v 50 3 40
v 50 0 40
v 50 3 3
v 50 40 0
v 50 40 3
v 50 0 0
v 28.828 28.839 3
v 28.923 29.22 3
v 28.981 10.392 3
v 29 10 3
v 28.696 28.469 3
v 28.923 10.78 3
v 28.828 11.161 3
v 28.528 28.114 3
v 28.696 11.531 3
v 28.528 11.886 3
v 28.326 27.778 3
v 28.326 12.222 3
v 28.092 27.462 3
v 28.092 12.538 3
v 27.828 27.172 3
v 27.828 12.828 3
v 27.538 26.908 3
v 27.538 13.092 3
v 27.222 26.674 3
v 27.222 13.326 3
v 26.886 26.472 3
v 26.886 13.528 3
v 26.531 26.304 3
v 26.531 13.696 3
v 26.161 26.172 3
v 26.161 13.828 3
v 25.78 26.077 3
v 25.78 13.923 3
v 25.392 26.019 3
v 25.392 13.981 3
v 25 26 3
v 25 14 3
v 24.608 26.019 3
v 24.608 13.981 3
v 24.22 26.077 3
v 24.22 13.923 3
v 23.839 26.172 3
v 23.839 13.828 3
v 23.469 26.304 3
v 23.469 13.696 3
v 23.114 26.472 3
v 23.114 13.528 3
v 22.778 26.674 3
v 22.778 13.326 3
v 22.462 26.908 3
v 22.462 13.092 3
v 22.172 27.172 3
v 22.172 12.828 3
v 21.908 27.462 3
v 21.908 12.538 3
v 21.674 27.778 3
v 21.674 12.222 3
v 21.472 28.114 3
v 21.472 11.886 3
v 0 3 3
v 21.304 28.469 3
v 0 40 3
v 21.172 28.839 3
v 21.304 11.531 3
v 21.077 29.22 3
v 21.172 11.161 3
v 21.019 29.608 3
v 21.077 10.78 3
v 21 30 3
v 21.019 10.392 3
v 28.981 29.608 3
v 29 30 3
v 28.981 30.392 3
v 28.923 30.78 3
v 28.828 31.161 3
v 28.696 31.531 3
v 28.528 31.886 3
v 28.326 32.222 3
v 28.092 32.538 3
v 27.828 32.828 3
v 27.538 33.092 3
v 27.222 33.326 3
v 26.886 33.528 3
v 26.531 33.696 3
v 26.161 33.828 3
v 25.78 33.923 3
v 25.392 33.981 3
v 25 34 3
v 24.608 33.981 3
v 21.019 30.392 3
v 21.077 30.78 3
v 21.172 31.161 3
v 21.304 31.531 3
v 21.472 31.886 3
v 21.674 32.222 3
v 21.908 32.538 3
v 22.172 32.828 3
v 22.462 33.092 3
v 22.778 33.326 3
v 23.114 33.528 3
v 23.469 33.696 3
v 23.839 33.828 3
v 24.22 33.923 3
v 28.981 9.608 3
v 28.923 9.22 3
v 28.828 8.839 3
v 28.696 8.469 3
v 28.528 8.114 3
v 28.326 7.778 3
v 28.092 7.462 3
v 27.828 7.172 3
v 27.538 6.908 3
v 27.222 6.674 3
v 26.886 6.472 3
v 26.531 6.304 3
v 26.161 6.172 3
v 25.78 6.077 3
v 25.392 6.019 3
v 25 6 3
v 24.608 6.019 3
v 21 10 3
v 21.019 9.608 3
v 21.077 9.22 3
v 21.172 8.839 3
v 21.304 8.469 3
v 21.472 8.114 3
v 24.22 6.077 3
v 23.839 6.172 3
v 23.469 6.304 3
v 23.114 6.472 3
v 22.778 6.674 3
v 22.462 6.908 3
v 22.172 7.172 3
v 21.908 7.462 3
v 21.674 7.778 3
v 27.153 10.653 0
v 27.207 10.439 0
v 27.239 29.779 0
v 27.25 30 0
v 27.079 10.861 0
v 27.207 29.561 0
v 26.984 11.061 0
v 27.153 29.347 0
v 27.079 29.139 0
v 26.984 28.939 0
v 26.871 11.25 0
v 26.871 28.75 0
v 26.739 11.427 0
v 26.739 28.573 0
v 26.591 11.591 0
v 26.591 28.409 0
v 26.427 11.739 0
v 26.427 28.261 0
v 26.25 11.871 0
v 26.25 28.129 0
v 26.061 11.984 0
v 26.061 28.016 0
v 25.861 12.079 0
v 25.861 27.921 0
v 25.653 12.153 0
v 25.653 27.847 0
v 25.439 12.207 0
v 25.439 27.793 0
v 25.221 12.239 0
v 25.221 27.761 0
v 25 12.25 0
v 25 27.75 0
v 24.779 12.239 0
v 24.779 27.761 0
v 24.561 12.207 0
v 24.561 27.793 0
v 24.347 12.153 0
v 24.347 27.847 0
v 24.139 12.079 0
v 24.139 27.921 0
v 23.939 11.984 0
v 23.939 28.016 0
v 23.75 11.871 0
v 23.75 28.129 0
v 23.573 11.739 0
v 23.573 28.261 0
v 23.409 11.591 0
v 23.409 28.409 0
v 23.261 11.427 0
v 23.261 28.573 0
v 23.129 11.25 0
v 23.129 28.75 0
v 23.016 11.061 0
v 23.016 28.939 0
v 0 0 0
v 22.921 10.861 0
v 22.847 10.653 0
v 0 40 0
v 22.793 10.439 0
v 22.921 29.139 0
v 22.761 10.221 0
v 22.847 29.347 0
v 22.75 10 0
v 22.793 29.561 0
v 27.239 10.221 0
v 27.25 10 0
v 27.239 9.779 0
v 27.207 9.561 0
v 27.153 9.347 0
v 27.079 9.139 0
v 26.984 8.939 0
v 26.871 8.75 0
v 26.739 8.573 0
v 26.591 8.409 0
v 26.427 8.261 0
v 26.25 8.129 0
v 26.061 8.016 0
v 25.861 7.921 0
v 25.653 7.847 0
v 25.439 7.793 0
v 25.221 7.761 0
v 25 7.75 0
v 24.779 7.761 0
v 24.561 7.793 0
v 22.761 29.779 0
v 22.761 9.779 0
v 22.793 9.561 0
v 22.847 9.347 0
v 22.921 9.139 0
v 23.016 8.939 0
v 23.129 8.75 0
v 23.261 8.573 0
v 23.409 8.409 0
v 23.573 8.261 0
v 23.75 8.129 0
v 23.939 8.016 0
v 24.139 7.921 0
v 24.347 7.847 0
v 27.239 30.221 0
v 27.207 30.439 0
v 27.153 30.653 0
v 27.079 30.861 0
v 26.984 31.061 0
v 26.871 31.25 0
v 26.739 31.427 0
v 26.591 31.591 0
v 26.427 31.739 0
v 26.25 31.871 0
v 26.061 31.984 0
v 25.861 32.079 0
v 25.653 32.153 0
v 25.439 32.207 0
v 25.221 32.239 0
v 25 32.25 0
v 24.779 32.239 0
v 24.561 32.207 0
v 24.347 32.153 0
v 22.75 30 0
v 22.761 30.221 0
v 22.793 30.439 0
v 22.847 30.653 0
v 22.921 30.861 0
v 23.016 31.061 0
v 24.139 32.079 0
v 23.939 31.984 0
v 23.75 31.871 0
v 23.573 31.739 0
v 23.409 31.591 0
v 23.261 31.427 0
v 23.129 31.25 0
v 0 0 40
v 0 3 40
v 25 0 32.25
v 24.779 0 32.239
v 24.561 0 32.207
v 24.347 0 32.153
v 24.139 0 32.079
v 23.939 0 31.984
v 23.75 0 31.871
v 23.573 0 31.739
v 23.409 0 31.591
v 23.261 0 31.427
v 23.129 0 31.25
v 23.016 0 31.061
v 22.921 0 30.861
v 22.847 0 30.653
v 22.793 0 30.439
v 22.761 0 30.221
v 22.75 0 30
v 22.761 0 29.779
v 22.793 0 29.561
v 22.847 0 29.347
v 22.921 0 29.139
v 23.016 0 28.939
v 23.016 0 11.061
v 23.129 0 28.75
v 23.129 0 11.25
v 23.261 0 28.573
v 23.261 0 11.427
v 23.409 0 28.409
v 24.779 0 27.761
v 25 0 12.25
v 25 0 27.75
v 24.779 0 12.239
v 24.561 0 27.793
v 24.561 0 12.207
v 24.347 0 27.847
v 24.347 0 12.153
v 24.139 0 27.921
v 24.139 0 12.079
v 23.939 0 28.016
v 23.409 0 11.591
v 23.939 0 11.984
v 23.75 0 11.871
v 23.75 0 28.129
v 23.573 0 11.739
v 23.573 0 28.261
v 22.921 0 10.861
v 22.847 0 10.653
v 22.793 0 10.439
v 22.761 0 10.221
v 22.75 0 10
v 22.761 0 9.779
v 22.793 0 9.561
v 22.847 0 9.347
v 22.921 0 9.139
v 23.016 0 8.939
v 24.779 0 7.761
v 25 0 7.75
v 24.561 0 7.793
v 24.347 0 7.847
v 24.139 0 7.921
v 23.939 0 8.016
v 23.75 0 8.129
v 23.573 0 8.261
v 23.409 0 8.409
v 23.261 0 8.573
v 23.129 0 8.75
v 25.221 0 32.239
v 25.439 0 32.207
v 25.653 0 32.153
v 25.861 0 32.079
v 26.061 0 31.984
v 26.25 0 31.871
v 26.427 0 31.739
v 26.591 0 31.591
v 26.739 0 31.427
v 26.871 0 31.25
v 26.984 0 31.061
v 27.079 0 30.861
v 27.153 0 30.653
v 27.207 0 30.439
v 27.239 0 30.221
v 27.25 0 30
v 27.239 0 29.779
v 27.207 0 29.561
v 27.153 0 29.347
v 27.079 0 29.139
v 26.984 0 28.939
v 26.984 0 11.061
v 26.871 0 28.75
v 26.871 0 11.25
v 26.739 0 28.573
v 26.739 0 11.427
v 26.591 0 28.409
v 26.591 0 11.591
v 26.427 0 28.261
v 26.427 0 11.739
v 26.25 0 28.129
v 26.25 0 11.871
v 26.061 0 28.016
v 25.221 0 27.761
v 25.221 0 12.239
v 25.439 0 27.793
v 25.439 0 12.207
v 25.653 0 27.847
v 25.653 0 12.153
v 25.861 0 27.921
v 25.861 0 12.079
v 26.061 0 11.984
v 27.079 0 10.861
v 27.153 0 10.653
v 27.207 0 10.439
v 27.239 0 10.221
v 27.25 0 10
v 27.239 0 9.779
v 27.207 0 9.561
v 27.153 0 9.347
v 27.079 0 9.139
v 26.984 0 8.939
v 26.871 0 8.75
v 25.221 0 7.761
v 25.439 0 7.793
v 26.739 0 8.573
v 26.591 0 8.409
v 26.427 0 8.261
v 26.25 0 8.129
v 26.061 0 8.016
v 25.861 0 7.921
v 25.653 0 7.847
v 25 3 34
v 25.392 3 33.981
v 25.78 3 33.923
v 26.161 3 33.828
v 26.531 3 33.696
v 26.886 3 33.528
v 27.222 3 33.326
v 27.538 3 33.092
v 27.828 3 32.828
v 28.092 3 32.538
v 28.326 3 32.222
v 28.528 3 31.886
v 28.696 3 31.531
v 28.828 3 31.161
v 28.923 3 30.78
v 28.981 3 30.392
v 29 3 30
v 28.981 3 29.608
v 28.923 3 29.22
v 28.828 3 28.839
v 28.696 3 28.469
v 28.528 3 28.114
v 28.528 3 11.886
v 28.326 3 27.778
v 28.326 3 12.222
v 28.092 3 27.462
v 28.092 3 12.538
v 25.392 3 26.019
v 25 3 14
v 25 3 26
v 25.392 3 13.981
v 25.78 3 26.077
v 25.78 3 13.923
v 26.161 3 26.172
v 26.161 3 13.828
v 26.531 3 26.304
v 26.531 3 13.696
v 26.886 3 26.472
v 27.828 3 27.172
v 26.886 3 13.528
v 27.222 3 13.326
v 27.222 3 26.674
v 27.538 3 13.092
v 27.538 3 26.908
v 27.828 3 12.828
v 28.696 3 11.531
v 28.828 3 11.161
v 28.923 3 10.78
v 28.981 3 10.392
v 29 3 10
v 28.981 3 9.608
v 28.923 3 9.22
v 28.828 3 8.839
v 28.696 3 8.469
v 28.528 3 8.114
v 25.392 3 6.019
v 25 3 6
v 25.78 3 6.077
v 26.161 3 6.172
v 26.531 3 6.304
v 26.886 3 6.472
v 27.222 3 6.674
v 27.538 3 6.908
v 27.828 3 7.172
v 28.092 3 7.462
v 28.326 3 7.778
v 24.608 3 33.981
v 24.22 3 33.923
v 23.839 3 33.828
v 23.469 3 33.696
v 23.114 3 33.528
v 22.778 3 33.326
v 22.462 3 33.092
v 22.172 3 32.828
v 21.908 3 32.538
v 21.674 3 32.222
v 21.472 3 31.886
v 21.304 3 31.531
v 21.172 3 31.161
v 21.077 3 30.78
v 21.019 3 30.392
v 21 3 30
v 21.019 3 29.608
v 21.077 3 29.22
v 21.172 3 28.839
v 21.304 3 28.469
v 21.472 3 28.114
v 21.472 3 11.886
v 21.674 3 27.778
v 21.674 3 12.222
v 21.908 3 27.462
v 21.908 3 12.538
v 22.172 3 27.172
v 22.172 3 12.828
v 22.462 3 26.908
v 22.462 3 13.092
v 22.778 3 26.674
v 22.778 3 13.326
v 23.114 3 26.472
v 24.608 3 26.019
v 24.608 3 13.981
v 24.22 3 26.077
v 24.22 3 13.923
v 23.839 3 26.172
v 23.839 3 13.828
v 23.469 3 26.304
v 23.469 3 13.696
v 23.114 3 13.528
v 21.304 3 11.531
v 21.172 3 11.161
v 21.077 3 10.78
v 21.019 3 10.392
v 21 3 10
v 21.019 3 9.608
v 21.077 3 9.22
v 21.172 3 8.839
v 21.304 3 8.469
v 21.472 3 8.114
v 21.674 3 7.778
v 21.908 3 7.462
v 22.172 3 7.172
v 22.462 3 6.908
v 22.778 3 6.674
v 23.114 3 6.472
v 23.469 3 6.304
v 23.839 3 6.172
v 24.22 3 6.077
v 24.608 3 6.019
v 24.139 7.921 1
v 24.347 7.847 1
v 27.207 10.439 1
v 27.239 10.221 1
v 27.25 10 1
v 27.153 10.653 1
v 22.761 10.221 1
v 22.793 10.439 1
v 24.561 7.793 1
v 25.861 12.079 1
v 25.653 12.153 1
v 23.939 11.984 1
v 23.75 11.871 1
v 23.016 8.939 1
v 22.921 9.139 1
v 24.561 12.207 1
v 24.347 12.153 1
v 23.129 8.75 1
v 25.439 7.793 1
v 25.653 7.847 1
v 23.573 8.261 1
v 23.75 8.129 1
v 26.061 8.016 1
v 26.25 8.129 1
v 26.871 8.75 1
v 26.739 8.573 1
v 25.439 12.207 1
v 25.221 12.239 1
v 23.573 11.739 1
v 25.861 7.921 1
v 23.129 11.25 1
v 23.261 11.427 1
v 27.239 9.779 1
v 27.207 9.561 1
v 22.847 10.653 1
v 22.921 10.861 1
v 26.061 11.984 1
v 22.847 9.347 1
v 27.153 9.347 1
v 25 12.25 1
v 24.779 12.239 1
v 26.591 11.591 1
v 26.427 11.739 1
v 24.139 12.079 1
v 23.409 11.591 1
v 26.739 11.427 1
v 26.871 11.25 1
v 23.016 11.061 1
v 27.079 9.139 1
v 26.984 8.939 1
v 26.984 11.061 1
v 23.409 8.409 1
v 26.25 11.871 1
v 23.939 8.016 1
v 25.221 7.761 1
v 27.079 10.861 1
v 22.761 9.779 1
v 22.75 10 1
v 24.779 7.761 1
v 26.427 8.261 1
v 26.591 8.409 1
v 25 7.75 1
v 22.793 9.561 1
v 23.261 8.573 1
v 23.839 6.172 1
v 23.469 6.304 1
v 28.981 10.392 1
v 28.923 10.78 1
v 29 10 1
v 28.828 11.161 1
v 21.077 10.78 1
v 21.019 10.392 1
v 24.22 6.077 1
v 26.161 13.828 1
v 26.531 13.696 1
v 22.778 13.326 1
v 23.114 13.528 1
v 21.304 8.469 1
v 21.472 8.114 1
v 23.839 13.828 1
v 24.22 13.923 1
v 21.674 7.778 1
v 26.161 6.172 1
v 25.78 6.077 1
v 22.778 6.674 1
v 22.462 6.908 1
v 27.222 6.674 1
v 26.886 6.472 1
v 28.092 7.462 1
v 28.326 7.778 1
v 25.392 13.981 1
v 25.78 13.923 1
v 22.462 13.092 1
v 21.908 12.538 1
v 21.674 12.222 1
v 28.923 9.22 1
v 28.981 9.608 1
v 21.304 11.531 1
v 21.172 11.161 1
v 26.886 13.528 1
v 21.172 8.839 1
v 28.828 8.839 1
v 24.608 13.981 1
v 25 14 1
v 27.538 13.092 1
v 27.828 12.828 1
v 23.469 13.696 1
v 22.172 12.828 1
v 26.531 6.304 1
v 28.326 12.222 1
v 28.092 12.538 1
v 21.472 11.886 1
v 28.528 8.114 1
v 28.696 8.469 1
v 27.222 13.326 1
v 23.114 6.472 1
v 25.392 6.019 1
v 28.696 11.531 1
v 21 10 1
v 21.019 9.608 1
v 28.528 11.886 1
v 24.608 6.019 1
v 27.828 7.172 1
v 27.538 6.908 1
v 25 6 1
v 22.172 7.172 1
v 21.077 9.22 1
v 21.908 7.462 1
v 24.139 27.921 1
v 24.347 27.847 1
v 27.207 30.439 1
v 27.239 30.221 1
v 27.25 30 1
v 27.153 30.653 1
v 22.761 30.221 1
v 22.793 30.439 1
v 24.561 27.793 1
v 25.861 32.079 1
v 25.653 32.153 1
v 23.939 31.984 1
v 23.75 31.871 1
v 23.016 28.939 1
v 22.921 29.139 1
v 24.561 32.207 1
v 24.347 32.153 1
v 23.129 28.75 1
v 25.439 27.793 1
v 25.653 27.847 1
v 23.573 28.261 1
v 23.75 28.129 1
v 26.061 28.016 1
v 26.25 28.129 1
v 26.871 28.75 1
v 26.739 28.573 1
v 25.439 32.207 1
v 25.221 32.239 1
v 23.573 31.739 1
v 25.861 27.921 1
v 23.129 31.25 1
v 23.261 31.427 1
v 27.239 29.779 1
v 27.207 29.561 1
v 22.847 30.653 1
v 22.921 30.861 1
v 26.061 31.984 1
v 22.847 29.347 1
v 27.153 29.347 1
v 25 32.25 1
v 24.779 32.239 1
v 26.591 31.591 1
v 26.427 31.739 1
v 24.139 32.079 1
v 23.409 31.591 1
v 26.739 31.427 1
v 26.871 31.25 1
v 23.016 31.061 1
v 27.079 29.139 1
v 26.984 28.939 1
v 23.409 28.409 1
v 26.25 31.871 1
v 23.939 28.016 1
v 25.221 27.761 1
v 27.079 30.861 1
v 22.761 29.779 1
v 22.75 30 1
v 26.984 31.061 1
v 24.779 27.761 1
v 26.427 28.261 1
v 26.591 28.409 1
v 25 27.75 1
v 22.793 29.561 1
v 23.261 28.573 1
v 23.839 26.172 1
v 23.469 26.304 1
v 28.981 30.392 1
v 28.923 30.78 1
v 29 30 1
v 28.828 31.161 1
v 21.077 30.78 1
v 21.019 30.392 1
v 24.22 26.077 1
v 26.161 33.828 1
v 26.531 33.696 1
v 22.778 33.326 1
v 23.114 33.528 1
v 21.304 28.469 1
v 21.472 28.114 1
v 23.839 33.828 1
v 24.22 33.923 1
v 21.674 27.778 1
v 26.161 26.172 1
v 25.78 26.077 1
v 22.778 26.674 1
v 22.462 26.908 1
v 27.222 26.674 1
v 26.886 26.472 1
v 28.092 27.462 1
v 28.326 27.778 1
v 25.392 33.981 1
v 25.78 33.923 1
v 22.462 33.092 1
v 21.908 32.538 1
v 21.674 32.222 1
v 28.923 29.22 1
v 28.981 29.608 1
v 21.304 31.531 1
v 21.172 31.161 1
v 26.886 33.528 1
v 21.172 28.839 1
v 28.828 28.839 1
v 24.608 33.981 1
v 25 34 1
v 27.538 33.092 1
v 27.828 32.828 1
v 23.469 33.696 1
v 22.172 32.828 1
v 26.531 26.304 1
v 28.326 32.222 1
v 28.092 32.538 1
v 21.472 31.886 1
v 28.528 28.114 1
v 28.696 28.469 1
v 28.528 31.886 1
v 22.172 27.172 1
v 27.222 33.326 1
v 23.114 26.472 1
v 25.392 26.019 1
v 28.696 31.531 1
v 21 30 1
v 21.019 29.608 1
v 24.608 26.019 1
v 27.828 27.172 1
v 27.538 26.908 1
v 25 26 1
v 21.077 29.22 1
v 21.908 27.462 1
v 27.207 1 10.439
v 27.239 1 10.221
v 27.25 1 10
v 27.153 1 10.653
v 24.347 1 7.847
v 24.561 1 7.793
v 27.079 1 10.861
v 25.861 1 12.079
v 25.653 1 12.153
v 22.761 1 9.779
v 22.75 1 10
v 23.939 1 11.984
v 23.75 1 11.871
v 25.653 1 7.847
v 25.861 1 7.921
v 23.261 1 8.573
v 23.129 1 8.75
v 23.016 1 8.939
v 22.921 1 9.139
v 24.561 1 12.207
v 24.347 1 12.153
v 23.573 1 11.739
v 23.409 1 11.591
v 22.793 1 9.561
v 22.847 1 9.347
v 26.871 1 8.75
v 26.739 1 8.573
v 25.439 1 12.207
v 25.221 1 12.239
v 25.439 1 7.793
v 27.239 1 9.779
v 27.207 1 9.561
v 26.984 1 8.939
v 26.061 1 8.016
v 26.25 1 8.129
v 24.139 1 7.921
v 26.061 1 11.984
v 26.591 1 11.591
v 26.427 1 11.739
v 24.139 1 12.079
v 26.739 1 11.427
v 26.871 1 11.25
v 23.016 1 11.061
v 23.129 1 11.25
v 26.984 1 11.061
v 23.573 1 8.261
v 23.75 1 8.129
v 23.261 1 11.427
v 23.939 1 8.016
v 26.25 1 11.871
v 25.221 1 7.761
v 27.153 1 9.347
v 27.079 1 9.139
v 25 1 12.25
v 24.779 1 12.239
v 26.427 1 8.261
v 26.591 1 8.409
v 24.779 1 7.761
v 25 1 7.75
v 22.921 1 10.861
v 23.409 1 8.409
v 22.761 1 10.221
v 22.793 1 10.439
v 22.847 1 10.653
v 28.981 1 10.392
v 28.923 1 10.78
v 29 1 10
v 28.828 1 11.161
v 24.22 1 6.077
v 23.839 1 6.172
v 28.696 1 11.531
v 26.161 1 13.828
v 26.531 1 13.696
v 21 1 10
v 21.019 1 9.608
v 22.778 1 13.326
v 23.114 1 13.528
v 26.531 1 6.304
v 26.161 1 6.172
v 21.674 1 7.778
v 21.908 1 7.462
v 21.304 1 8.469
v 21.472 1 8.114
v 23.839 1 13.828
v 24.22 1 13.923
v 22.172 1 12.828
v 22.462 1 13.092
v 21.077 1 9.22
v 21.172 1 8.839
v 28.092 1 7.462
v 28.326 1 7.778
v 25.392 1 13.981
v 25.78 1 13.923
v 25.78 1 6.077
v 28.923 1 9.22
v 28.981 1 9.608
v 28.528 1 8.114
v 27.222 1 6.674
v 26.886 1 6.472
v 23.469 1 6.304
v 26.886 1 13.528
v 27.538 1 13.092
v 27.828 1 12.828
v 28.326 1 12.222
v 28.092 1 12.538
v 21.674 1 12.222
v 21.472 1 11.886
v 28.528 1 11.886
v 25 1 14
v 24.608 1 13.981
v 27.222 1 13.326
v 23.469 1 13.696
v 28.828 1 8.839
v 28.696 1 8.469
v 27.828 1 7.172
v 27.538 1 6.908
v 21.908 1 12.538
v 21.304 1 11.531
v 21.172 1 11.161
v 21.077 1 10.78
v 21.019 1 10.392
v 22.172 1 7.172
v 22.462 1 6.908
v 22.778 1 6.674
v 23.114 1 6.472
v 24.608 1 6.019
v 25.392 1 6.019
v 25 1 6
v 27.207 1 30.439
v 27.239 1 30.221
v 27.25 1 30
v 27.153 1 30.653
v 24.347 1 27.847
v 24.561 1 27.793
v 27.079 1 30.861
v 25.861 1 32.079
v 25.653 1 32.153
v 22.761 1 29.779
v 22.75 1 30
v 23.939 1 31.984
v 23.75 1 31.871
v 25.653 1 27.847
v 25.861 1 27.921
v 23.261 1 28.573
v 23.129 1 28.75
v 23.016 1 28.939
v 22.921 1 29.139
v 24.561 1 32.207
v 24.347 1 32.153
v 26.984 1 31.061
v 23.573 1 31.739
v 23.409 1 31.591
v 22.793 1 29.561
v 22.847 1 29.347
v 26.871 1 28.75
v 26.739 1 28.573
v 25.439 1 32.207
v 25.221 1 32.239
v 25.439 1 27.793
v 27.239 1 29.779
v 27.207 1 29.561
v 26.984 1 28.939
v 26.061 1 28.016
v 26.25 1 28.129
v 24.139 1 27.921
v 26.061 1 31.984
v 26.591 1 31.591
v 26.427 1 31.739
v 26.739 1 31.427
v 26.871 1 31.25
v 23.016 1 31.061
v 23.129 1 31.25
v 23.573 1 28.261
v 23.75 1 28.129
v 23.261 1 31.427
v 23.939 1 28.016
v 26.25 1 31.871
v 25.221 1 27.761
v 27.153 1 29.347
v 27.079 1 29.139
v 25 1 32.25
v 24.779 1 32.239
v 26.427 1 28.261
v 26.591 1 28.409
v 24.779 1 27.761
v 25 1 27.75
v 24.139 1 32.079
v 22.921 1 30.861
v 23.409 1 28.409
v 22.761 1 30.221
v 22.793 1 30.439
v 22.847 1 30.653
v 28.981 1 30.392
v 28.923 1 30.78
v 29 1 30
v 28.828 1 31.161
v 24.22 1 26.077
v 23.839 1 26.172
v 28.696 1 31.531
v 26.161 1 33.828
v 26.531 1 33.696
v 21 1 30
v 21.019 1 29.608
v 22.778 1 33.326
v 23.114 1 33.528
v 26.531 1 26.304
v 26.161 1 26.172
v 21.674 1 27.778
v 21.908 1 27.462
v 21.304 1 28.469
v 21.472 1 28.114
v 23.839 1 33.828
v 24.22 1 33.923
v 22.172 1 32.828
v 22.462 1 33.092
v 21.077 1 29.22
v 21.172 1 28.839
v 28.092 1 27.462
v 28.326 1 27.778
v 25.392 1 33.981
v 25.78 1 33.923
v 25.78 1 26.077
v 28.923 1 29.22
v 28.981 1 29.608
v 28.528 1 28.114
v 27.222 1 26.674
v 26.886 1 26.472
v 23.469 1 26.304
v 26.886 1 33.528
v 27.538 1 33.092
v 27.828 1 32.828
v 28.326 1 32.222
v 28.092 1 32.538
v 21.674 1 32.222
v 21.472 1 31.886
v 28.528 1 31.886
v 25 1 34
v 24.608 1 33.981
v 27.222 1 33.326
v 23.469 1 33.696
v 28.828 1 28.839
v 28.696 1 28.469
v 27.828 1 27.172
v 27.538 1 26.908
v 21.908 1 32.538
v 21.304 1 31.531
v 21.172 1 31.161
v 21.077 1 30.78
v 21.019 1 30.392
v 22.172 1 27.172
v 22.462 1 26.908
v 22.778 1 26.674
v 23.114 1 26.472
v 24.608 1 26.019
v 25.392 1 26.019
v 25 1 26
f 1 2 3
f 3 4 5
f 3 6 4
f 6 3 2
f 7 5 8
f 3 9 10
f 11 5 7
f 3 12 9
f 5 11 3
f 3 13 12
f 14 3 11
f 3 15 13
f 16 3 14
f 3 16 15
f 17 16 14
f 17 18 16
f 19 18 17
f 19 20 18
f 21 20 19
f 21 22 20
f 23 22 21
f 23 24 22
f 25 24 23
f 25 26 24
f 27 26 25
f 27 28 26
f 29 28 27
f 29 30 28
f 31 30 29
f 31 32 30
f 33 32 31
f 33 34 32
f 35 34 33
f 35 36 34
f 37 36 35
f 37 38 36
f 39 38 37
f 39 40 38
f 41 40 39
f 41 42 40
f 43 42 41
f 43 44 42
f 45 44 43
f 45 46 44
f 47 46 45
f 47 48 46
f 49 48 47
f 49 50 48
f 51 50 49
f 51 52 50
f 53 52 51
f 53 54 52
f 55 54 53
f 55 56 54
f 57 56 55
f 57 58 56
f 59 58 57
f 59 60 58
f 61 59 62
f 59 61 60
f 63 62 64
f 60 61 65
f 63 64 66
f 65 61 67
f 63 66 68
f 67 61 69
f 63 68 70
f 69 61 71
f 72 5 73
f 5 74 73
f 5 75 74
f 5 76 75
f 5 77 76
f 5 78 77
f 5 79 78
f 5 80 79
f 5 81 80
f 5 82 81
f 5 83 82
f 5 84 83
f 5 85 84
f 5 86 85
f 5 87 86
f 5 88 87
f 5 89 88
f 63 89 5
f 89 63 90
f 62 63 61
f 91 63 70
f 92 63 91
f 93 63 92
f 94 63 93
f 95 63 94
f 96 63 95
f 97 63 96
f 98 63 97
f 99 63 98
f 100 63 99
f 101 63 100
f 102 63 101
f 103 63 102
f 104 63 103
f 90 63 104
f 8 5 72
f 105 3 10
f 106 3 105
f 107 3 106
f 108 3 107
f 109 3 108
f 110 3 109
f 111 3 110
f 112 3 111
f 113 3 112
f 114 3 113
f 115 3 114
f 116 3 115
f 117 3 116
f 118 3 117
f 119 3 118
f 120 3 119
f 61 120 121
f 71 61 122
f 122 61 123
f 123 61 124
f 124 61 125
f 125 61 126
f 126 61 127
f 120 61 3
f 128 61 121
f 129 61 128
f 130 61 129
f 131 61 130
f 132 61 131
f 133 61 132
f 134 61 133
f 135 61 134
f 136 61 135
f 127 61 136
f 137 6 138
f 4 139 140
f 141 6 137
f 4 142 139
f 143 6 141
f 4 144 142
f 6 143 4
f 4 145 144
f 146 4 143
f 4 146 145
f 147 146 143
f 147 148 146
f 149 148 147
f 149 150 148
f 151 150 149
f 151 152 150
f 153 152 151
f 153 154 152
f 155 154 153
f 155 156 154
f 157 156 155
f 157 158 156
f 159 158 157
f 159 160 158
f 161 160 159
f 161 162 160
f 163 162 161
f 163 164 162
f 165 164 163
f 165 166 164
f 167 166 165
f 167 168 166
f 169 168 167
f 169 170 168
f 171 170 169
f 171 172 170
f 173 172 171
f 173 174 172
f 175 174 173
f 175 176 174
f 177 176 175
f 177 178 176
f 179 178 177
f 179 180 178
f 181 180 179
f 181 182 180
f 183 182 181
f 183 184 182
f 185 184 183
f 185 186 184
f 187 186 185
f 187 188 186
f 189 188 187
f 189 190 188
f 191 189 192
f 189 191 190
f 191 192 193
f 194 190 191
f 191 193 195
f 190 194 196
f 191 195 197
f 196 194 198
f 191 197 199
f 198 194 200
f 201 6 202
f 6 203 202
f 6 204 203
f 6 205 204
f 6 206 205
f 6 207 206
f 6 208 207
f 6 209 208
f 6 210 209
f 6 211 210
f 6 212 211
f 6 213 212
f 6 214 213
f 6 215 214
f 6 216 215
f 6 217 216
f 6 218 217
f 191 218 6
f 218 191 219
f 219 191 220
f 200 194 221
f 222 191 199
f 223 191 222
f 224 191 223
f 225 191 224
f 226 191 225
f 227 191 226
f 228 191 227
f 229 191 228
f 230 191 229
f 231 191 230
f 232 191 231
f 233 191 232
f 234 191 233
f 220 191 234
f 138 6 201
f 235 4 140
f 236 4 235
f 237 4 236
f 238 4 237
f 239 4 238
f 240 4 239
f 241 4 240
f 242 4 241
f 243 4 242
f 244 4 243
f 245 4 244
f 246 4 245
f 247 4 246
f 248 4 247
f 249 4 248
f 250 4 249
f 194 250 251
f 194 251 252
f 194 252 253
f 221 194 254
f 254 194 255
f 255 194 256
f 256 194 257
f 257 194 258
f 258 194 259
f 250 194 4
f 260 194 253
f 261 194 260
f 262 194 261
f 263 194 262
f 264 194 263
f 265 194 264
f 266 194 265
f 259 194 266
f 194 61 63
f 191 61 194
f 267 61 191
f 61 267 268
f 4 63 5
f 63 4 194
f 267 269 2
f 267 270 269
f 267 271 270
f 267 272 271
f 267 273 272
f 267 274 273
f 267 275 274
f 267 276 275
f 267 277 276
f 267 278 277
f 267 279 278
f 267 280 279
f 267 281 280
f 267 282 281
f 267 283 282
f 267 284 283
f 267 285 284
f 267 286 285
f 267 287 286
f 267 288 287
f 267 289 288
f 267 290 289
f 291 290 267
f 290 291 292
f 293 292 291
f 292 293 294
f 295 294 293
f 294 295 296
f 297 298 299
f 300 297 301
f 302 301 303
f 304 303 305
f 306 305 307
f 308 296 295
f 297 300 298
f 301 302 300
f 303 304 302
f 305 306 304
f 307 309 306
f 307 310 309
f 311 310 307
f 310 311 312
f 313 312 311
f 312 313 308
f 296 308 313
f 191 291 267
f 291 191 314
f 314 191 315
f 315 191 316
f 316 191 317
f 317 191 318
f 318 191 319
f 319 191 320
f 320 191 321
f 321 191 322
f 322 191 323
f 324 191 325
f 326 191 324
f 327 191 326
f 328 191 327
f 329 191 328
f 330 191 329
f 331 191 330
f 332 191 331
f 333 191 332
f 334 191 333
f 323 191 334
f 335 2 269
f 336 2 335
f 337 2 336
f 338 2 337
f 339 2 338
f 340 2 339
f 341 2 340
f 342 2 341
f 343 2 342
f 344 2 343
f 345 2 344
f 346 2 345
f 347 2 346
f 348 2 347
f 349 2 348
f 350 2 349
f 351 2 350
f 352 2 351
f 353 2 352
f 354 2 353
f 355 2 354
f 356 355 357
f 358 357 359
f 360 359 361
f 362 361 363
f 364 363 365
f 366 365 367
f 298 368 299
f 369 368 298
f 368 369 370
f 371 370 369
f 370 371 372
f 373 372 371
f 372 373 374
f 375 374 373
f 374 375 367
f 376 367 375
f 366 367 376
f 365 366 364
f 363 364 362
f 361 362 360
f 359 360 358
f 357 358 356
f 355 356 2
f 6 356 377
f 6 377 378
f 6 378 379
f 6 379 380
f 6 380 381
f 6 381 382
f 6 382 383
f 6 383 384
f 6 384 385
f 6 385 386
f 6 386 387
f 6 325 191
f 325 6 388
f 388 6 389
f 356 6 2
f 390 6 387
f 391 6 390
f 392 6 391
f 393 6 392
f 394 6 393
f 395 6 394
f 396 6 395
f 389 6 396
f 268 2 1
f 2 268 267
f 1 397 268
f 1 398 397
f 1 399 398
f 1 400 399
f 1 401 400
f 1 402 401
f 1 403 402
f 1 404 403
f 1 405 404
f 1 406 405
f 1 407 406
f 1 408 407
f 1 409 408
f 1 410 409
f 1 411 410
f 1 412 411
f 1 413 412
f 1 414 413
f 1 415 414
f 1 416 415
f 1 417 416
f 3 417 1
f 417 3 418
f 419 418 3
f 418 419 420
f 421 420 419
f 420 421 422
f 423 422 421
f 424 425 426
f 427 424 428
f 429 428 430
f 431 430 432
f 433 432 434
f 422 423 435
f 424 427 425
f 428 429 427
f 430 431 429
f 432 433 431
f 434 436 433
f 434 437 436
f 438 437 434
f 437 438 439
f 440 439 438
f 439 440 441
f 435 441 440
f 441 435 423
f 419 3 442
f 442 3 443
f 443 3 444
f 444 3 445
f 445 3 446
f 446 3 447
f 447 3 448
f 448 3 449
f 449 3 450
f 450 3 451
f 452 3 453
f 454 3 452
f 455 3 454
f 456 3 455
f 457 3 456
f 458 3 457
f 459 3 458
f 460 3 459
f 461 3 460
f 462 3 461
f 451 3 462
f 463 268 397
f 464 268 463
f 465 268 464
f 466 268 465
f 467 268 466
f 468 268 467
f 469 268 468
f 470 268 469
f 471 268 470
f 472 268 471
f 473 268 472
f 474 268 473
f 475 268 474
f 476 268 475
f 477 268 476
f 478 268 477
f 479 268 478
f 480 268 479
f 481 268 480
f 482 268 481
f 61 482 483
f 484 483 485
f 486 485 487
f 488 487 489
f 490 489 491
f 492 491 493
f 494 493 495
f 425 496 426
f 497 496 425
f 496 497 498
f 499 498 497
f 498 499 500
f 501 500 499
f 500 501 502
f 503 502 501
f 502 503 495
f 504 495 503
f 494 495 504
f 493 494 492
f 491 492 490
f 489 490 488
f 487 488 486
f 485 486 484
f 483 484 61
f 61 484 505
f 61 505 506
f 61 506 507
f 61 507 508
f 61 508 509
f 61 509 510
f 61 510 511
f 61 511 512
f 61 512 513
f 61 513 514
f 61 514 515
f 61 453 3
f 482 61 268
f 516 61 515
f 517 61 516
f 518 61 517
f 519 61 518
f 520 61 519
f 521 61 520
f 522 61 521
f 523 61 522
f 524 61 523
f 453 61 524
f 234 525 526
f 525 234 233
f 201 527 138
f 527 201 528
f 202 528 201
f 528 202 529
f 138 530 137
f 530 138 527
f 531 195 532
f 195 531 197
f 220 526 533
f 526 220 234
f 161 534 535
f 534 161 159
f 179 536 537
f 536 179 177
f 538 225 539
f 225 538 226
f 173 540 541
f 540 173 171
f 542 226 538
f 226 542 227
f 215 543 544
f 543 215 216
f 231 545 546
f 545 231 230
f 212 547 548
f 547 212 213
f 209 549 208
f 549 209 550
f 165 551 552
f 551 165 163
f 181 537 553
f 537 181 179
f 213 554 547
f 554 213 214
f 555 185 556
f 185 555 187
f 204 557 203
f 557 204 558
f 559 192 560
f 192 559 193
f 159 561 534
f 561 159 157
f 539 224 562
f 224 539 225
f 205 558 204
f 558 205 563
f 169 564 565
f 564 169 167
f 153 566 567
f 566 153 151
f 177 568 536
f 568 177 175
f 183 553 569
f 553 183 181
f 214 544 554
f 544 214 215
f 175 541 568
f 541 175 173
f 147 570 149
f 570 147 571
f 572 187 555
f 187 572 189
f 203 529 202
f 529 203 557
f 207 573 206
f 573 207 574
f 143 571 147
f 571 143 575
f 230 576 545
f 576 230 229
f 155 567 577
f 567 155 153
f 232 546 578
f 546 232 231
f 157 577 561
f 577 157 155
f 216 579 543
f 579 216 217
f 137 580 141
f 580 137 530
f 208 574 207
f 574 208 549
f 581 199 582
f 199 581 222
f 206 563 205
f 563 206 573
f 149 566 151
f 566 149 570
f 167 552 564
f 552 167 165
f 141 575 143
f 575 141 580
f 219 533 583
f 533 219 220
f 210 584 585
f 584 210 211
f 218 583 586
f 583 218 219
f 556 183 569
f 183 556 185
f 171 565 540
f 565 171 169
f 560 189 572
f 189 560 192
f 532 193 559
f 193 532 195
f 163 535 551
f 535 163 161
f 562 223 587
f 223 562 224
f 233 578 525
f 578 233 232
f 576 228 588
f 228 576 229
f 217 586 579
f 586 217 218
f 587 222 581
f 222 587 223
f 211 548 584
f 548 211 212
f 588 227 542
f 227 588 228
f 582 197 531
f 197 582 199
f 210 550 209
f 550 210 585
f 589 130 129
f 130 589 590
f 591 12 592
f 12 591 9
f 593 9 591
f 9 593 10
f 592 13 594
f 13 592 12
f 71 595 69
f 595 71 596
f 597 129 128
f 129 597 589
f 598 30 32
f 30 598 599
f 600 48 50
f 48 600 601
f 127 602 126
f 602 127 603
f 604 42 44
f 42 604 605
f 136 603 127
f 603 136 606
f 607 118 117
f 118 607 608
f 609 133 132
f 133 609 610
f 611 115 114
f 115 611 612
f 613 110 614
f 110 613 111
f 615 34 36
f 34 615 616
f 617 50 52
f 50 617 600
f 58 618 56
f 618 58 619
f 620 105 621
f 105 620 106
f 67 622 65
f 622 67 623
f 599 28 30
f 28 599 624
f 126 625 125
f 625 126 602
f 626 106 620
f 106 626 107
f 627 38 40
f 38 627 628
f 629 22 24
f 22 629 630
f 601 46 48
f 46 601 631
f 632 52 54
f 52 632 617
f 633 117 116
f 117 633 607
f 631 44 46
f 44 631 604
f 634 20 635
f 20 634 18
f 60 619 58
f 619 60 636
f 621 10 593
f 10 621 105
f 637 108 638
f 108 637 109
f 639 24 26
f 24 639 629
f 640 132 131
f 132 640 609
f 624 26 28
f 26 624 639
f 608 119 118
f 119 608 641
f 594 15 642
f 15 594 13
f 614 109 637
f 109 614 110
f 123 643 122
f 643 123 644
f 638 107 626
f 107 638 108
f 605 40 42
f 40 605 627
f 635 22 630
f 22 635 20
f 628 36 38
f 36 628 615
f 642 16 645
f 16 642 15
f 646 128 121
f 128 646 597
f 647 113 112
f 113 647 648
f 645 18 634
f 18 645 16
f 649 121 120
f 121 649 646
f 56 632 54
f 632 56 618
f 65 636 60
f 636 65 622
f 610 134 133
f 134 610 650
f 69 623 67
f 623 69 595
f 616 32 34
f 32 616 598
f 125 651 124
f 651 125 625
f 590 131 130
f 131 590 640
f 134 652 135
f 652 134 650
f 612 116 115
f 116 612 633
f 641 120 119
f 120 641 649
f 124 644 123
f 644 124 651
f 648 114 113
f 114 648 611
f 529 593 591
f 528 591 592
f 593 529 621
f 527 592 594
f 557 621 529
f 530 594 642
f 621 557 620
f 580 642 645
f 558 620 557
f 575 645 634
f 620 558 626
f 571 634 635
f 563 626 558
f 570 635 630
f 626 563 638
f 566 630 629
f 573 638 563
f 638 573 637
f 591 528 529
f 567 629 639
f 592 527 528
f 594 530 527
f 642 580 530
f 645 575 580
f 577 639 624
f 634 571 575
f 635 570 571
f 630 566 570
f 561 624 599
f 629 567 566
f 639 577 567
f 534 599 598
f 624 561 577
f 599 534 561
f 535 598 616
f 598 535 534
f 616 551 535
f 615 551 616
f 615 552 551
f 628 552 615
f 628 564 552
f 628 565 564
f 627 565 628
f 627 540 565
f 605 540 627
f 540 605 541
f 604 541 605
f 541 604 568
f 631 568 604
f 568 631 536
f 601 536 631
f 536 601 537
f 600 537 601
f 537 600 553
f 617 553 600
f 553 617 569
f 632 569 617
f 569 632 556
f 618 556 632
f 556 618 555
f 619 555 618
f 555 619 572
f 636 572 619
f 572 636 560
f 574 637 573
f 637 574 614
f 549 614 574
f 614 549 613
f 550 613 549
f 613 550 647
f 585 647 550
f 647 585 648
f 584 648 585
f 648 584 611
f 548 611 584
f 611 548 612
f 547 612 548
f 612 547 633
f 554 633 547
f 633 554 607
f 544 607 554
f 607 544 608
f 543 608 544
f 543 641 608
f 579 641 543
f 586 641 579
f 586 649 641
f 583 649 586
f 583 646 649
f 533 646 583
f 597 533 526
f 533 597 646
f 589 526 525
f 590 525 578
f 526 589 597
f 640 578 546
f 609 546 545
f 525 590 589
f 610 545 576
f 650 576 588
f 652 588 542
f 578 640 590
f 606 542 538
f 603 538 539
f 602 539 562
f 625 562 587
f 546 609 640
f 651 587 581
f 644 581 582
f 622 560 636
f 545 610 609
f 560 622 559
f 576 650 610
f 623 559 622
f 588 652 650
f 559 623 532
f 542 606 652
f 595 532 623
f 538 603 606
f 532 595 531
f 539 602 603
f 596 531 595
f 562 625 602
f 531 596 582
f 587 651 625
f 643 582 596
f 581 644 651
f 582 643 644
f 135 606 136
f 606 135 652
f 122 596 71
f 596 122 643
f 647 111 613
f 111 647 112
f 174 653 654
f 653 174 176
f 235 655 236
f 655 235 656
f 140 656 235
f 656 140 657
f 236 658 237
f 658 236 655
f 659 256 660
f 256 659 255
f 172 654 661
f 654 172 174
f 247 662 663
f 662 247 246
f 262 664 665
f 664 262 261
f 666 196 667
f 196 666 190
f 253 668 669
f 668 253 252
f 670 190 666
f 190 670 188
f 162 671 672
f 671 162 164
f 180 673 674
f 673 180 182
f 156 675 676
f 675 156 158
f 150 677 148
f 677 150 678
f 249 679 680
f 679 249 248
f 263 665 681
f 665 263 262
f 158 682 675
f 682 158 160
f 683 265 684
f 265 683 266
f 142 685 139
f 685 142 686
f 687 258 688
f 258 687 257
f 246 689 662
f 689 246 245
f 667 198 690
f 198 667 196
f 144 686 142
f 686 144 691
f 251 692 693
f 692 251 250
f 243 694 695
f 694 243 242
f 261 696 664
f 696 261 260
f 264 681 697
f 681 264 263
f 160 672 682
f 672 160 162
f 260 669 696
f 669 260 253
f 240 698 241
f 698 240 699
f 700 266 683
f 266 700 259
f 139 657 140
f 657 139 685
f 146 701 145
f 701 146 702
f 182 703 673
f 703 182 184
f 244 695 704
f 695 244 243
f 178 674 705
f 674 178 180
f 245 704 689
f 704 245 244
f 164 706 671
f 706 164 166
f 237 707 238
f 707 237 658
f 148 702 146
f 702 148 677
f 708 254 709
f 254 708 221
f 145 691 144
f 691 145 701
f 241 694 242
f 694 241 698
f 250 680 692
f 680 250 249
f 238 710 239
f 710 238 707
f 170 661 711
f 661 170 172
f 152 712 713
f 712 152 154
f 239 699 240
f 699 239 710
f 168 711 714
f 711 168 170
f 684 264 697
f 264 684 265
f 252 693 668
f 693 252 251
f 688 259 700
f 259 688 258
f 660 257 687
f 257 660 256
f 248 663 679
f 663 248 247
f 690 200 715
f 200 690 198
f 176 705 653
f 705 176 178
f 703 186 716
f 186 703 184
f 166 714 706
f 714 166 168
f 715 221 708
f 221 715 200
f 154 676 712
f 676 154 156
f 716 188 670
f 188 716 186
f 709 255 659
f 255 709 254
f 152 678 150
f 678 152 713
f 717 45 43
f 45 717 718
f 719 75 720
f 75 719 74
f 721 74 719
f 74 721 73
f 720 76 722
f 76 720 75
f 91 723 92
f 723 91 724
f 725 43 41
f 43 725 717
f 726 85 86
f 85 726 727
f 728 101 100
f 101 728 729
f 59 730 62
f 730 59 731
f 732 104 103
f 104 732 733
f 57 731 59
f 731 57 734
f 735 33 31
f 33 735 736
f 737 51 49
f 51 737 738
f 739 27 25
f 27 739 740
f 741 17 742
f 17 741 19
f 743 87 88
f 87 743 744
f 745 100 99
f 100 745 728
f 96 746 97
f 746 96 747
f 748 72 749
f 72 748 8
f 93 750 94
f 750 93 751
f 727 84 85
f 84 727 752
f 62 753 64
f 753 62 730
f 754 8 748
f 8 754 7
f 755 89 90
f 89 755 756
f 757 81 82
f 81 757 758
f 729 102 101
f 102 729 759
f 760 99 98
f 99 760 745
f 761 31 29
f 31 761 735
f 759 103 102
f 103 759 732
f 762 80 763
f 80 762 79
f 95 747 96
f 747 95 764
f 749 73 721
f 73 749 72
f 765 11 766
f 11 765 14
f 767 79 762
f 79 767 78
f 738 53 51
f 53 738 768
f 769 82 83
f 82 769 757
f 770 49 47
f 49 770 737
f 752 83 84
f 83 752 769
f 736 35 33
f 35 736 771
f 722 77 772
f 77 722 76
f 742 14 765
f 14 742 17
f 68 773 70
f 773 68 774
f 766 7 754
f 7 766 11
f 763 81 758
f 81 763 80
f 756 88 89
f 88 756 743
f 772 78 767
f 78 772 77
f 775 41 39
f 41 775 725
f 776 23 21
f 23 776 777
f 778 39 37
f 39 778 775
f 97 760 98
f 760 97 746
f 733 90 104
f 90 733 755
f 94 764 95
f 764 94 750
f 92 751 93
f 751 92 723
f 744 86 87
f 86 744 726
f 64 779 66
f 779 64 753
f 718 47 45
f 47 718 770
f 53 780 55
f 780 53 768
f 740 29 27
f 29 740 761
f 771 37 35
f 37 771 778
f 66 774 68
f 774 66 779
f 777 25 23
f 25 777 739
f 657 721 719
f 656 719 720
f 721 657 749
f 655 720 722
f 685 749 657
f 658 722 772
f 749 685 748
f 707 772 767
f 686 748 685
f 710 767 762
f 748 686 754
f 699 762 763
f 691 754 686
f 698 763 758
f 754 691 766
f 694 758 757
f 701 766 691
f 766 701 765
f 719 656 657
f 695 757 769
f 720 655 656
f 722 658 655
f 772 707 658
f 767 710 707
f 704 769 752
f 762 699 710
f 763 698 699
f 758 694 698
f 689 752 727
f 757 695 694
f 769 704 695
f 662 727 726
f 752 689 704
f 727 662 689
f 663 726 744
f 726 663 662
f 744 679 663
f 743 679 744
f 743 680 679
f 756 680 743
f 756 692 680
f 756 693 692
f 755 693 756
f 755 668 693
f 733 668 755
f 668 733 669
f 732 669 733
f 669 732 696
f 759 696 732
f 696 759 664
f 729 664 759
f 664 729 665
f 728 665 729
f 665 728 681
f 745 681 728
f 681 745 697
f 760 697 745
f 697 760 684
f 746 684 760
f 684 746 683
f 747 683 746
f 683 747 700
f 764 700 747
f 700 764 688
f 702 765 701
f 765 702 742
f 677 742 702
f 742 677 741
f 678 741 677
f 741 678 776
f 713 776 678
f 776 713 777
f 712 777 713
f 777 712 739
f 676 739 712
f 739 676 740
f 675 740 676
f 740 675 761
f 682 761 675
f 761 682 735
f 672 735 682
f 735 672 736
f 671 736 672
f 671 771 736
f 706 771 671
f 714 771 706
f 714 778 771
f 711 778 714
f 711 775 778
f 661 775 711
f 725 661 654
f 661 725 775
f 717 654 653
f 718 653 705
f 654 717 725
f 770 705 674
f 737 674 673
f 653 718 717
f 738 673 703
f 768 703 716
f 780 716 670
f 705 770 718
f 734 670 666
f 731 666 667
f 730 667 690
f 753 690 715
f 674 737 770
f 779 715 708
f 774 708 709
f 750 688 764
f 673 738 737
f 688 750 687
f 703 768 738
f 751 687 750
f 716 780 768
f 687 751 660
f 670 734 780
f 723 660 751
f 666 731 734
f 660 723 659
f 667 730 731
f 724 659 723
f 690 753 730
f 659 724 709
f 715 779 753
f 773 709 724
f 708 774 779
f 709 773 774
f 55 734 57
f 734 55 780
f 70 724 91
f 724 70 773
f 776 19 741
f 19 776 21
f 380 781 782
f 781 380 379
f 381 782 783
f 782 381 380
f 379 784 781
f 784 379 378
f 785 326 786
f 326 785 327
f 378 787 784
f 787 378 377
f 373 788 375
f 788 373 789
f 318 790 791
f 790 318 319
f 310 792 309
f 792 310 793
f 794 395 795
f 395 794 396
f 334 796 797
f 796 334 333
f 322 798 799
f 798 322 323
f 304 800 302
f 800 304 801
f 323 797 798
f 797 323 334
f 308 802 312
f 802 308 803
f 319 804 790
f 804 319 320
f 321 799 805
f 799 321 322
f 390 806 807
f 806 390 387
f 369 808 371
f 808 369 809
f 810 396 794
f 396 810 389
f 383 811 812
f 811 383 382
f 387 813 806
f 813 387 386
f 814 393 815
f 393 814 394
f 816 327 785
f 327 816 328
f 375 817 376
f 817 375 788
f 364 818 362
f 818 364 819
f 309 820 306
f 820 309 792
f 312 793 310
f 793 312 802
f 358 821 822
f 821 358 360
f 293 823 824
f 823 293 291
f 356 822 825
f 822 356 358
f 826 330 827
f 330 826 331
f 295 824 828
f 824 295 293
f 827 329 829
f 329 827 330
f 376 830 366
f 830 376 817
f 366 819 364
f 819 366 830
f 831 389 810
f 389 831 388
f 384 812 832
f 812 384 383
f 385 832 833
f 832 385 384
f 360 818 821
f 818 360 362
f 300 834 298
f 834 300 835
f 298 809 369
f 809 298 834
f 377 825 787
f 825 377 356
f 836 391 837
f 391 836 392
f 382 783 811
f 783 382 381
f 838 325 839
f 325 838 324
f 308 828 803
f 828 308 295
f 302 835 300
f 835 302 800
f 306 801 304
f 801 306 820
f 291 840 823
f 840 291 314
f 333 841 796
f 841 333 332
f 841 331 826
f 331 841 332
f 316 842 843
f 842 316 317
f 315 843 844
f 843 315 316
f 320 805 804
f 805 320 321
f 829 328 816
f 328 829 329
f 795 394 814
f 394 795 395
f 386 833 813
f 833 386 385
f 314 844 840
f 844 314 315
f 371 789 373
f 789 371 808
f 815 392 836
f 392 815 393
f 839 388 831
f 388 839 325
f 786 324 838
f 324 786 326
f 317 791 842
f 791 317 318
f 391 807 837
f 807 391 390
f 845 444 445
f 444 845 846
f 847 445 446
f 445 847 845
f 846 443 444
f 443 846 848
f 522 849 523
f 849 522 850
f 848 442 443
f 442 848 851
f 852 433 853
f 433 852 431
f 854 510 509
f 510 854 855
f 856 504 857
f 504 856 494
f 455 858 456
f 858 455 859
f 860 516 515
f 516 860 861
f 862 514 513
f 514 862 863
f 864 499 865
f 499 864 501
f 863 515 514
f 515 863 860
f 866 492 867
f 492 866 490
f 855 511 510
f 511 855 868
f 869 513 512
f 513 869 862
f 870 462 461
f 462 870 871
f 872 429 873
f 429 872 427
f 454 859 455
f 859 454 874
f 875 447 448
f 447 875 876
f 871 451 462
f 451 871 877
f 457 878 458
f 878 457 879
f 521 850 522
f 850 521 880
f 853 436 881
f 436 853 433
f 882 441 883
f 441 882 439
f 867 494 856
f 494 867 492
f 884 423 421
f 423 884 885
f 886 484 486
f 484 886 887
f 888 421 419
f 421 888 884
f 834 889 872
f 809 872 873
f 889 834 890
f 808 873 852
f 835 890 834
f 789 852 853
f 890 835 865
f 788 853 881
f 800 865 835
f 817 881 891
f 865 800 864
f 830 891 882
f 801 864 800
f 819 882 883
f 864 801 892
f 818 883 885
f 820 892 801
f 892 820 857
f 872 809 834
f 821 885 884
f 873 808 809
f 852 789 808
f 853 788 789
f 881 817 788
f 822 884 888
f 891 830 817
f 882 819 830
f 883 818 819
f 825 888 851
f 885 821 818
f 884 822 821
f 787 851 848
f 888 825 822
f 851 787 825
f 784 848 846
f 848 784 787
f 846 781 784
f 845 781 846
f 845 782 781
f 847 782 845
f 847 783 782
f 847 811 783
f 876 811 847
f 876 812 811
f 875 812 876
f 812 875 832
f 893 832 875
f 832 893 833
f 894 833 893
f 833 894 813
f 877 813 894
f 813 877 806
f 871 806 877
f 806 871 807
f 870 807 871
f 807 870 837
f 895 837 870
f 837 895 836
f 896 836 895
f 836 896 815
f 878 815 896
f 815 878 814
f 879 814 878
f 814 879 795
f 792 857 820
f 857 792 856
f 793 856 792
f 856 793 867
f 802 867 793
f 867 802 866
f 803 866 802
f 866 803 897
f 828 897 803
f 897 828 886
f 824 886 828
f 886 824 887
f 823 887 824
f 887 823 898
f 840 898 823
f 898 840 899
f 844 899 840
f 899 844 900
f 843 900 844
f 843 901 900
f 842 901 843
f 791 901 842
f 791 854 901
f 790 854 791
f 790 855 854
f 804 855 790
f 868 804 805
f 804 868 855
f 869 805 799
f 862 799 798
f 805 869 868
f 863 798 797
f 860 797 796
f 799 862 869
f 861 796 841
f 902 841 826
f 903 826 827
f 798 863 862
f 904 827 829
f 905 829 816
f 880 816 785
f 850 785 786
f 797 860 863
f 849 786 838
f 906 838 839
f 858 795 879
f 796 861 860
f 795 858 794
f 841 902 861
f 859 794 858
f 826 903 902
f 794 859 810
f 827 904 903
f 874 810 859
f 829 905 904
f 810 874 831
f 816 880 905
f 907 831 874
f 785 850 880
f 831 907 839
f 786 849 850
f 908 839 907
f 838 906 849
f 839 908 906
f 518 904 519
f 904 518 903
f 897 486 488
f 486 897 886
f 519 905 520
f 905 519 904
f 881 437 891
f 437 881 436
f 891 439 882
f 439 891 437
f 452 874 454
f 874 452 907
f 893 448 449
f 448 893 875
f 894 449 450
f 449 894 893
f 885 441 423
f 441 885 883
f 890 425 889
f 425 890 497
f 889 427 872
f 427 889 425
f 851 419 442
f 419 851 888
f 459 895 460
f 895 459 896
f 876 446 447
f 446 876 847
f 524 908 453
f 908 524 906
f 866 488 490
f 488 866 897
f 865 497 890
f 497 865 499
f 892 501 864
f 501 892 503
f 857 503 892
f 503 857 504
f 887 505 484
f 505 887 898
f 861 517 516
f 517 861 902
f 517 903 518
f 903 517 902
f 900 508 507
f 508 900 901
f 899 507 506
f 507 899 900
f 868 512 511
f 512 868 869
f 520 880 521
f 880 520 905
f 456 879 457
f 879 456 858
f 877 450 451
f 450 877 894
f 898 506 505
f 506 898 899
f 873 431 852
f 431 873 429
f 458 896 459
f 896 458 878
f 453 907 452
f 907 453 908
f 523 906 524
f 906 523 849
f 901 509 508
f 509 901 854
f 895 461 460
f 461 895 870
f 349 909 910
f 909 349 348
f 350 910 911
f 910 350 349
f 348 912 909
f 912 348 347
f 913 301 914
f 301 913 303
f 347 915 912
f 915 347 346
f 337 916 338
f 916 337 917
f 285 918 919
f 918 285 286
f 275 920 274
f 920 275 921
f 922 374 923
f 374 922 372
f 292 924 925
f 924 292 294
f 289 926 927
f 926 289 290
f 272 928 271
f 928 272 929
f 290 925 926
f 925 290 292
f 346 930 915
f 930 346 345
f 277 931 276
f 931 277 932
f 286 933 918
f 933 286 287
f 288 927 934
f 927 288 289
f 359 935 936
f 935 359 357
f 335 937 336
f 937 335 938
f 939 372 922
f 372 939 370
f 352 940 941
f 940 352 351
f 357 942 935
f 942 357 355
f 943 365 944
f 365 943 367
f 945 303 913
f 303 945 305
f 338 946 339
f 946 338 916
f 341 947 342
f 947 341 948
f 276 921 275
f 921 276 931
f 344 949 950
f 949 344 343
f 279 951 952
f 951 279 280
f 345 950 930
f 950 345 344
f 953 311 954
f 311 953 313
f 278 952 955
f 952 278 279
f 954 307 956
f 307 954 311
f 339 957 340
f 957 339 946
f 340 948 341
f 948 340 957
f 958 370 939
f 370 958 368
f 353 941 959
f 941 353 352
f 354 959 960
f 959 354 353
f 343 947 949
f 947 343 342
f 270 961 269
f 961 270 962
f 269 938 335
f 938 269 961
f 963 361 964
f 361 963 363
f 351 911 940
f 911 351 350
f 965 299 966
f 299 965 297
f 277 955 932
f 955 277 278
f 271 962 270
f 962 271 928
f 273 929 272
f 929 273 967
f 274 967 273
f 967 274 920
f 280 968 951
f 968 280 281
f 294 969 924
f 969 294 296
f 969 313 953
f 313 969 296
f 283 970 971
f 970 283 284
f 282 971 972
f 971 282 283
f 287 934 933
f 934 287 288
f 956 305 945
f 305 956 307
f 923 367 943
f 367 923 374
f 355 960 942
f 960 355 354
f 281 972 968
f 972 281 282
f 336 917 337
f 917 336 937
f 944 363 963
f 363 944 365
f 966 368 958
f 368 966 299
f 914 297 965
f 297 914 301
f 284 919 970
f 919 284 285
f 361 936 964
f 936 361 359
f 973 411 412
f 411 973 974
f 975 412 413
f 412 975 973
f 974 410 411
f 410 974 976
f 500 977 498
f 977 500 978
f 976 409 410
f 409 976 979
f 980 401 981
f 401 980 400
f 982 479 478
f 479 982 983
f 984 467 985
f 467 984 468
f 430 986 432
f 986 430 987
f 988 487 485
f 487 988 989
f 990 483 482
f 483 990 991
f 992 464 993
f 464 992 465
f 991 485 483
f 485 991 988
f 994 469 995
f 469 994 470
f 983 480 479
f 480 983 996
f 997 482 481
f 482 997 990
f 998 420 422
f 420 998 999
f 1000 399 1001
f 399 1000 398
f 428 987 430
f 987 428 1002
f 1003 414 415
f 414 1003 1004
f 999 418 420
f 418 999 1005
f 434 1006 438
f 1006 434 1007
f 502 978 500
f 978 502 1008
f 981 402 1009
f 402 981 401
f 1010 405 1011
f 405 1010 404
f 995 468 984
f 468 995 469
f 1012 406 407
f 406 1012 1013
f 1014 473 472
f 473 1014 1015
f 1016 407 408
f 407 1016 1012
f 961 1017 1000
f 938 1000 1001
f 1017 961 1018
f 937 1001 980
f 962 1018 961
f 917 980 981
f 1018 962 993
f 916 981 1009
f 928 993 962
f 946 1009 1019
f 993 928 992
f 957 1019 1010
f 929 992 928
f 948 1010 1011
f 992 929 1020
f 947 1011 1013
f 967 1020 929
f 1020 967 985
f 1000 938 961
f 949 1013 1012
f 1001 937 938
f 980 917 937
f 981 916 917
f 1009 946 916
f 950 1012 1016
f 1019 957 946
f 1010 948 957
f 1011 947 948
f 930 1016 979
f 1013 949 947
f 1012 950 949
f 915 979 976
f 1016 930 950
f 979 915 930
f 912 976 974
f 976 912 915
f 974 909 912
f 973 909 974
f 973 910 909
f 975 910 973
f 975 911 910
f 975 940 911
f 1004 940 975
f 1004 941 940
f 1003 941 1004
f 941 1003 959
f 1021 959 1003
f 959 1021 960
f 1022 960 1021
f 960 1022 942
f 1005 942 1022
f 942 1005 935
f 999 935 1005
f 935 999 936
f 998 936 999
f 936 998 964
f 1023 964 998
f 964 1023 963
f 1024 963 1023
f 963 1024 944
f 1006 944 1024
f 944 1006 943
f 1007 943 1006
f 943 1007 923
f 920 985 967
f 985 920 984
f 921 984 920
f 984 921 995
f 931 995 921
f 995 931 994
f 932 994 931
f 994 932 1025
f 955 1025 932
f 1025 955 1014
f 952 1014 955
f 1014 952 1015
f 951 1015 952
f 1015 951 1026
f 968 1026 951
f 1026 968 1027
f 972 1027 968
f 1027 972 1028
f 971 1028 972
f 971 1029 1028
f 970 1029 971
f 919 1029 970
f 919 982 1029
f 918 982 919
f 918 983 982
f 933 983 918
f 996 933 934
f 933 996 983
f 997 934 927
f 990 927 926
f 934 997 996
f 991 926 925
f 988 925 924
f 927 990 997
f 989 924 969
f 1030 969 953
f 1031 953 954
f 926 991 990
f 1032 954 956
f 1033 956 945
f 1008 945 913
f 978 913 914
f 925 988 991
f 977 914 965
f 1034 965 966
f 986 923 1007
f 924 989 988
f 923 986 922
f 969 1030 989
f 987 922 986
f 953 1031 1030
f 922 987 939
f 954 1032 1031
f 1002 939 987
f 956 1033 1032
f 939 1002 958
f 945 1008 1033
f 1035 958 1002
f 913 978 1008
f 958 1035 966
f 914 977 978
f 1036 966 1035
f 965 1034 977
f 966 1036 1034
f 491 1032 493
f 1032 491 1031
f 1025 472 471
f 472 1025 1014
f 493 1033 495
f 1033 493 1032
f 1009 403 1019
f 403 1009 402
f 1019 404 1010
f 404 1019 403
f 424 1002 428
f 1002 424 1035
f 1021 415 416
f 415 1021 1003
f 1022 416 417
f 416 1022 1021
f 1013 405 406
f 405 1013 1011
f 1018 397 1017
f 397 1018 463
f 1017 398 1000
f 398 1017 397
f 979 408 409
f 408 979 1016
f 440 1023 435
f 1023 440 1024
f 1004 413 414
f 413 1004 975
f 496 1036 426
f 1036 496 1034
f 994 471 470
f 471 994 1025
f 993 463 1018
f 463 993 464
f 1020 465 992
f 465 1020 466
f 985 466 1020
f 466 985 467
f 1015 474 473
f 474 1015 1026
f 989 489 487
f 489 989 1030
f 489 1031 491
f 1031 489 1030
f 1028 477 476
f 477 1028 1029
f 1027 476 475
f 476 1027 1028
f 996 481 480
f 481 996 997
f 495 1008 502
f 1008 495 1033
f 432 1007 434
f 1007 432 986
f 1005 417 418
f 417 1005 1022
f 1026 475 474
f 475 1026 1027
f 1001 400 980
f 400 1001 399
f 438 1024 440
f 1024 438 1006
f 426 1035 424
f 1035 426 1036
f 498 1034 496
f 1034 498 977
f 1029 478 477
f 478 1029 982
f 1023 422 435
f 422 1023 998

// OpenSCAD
// Parameters
width = 50;
depth = 40;
height = 40;
thickness = 3;

hole_d = 4.5;
cs_d = 8;
cs_depth = 2;

$fn = 64;

difference() {
    union() {
        // Horizontal flange (+Y direction, thickness in +Z)
        cube([width, depth, thickness], center = false);
        // Vertical flange (+Z direction, thickness in +Y)
        cube([width, thickness, height], center = false);
    }
    // Countersunk holes on horizontal flange (outer face at z = thickness)
    for (ypos = [10, depth - 10]) {
        translate([width / 2, ypos, 0])
            cylinder(d = hole_d, h = thickness + 2);
        translate([width / 2, ypos, thickness - cs_depth])
            cylinder(d = cs_d, h = cs_depth);
    }
    // Countersunk holes on vertical flange (outer face at y = thickness)
    for (zpos = [10, height - 10]) {
        translate([width / 2, thickness, zpos])
            rotate([90, 0, 0])
                cylinder(d = hole_d, h = thickness + 2);
        translate([width / 2, thickness, zpos])
            rotate([90, 0, 0])
                cylinder(d = cs_d, h = cs_depth);
    }
}
